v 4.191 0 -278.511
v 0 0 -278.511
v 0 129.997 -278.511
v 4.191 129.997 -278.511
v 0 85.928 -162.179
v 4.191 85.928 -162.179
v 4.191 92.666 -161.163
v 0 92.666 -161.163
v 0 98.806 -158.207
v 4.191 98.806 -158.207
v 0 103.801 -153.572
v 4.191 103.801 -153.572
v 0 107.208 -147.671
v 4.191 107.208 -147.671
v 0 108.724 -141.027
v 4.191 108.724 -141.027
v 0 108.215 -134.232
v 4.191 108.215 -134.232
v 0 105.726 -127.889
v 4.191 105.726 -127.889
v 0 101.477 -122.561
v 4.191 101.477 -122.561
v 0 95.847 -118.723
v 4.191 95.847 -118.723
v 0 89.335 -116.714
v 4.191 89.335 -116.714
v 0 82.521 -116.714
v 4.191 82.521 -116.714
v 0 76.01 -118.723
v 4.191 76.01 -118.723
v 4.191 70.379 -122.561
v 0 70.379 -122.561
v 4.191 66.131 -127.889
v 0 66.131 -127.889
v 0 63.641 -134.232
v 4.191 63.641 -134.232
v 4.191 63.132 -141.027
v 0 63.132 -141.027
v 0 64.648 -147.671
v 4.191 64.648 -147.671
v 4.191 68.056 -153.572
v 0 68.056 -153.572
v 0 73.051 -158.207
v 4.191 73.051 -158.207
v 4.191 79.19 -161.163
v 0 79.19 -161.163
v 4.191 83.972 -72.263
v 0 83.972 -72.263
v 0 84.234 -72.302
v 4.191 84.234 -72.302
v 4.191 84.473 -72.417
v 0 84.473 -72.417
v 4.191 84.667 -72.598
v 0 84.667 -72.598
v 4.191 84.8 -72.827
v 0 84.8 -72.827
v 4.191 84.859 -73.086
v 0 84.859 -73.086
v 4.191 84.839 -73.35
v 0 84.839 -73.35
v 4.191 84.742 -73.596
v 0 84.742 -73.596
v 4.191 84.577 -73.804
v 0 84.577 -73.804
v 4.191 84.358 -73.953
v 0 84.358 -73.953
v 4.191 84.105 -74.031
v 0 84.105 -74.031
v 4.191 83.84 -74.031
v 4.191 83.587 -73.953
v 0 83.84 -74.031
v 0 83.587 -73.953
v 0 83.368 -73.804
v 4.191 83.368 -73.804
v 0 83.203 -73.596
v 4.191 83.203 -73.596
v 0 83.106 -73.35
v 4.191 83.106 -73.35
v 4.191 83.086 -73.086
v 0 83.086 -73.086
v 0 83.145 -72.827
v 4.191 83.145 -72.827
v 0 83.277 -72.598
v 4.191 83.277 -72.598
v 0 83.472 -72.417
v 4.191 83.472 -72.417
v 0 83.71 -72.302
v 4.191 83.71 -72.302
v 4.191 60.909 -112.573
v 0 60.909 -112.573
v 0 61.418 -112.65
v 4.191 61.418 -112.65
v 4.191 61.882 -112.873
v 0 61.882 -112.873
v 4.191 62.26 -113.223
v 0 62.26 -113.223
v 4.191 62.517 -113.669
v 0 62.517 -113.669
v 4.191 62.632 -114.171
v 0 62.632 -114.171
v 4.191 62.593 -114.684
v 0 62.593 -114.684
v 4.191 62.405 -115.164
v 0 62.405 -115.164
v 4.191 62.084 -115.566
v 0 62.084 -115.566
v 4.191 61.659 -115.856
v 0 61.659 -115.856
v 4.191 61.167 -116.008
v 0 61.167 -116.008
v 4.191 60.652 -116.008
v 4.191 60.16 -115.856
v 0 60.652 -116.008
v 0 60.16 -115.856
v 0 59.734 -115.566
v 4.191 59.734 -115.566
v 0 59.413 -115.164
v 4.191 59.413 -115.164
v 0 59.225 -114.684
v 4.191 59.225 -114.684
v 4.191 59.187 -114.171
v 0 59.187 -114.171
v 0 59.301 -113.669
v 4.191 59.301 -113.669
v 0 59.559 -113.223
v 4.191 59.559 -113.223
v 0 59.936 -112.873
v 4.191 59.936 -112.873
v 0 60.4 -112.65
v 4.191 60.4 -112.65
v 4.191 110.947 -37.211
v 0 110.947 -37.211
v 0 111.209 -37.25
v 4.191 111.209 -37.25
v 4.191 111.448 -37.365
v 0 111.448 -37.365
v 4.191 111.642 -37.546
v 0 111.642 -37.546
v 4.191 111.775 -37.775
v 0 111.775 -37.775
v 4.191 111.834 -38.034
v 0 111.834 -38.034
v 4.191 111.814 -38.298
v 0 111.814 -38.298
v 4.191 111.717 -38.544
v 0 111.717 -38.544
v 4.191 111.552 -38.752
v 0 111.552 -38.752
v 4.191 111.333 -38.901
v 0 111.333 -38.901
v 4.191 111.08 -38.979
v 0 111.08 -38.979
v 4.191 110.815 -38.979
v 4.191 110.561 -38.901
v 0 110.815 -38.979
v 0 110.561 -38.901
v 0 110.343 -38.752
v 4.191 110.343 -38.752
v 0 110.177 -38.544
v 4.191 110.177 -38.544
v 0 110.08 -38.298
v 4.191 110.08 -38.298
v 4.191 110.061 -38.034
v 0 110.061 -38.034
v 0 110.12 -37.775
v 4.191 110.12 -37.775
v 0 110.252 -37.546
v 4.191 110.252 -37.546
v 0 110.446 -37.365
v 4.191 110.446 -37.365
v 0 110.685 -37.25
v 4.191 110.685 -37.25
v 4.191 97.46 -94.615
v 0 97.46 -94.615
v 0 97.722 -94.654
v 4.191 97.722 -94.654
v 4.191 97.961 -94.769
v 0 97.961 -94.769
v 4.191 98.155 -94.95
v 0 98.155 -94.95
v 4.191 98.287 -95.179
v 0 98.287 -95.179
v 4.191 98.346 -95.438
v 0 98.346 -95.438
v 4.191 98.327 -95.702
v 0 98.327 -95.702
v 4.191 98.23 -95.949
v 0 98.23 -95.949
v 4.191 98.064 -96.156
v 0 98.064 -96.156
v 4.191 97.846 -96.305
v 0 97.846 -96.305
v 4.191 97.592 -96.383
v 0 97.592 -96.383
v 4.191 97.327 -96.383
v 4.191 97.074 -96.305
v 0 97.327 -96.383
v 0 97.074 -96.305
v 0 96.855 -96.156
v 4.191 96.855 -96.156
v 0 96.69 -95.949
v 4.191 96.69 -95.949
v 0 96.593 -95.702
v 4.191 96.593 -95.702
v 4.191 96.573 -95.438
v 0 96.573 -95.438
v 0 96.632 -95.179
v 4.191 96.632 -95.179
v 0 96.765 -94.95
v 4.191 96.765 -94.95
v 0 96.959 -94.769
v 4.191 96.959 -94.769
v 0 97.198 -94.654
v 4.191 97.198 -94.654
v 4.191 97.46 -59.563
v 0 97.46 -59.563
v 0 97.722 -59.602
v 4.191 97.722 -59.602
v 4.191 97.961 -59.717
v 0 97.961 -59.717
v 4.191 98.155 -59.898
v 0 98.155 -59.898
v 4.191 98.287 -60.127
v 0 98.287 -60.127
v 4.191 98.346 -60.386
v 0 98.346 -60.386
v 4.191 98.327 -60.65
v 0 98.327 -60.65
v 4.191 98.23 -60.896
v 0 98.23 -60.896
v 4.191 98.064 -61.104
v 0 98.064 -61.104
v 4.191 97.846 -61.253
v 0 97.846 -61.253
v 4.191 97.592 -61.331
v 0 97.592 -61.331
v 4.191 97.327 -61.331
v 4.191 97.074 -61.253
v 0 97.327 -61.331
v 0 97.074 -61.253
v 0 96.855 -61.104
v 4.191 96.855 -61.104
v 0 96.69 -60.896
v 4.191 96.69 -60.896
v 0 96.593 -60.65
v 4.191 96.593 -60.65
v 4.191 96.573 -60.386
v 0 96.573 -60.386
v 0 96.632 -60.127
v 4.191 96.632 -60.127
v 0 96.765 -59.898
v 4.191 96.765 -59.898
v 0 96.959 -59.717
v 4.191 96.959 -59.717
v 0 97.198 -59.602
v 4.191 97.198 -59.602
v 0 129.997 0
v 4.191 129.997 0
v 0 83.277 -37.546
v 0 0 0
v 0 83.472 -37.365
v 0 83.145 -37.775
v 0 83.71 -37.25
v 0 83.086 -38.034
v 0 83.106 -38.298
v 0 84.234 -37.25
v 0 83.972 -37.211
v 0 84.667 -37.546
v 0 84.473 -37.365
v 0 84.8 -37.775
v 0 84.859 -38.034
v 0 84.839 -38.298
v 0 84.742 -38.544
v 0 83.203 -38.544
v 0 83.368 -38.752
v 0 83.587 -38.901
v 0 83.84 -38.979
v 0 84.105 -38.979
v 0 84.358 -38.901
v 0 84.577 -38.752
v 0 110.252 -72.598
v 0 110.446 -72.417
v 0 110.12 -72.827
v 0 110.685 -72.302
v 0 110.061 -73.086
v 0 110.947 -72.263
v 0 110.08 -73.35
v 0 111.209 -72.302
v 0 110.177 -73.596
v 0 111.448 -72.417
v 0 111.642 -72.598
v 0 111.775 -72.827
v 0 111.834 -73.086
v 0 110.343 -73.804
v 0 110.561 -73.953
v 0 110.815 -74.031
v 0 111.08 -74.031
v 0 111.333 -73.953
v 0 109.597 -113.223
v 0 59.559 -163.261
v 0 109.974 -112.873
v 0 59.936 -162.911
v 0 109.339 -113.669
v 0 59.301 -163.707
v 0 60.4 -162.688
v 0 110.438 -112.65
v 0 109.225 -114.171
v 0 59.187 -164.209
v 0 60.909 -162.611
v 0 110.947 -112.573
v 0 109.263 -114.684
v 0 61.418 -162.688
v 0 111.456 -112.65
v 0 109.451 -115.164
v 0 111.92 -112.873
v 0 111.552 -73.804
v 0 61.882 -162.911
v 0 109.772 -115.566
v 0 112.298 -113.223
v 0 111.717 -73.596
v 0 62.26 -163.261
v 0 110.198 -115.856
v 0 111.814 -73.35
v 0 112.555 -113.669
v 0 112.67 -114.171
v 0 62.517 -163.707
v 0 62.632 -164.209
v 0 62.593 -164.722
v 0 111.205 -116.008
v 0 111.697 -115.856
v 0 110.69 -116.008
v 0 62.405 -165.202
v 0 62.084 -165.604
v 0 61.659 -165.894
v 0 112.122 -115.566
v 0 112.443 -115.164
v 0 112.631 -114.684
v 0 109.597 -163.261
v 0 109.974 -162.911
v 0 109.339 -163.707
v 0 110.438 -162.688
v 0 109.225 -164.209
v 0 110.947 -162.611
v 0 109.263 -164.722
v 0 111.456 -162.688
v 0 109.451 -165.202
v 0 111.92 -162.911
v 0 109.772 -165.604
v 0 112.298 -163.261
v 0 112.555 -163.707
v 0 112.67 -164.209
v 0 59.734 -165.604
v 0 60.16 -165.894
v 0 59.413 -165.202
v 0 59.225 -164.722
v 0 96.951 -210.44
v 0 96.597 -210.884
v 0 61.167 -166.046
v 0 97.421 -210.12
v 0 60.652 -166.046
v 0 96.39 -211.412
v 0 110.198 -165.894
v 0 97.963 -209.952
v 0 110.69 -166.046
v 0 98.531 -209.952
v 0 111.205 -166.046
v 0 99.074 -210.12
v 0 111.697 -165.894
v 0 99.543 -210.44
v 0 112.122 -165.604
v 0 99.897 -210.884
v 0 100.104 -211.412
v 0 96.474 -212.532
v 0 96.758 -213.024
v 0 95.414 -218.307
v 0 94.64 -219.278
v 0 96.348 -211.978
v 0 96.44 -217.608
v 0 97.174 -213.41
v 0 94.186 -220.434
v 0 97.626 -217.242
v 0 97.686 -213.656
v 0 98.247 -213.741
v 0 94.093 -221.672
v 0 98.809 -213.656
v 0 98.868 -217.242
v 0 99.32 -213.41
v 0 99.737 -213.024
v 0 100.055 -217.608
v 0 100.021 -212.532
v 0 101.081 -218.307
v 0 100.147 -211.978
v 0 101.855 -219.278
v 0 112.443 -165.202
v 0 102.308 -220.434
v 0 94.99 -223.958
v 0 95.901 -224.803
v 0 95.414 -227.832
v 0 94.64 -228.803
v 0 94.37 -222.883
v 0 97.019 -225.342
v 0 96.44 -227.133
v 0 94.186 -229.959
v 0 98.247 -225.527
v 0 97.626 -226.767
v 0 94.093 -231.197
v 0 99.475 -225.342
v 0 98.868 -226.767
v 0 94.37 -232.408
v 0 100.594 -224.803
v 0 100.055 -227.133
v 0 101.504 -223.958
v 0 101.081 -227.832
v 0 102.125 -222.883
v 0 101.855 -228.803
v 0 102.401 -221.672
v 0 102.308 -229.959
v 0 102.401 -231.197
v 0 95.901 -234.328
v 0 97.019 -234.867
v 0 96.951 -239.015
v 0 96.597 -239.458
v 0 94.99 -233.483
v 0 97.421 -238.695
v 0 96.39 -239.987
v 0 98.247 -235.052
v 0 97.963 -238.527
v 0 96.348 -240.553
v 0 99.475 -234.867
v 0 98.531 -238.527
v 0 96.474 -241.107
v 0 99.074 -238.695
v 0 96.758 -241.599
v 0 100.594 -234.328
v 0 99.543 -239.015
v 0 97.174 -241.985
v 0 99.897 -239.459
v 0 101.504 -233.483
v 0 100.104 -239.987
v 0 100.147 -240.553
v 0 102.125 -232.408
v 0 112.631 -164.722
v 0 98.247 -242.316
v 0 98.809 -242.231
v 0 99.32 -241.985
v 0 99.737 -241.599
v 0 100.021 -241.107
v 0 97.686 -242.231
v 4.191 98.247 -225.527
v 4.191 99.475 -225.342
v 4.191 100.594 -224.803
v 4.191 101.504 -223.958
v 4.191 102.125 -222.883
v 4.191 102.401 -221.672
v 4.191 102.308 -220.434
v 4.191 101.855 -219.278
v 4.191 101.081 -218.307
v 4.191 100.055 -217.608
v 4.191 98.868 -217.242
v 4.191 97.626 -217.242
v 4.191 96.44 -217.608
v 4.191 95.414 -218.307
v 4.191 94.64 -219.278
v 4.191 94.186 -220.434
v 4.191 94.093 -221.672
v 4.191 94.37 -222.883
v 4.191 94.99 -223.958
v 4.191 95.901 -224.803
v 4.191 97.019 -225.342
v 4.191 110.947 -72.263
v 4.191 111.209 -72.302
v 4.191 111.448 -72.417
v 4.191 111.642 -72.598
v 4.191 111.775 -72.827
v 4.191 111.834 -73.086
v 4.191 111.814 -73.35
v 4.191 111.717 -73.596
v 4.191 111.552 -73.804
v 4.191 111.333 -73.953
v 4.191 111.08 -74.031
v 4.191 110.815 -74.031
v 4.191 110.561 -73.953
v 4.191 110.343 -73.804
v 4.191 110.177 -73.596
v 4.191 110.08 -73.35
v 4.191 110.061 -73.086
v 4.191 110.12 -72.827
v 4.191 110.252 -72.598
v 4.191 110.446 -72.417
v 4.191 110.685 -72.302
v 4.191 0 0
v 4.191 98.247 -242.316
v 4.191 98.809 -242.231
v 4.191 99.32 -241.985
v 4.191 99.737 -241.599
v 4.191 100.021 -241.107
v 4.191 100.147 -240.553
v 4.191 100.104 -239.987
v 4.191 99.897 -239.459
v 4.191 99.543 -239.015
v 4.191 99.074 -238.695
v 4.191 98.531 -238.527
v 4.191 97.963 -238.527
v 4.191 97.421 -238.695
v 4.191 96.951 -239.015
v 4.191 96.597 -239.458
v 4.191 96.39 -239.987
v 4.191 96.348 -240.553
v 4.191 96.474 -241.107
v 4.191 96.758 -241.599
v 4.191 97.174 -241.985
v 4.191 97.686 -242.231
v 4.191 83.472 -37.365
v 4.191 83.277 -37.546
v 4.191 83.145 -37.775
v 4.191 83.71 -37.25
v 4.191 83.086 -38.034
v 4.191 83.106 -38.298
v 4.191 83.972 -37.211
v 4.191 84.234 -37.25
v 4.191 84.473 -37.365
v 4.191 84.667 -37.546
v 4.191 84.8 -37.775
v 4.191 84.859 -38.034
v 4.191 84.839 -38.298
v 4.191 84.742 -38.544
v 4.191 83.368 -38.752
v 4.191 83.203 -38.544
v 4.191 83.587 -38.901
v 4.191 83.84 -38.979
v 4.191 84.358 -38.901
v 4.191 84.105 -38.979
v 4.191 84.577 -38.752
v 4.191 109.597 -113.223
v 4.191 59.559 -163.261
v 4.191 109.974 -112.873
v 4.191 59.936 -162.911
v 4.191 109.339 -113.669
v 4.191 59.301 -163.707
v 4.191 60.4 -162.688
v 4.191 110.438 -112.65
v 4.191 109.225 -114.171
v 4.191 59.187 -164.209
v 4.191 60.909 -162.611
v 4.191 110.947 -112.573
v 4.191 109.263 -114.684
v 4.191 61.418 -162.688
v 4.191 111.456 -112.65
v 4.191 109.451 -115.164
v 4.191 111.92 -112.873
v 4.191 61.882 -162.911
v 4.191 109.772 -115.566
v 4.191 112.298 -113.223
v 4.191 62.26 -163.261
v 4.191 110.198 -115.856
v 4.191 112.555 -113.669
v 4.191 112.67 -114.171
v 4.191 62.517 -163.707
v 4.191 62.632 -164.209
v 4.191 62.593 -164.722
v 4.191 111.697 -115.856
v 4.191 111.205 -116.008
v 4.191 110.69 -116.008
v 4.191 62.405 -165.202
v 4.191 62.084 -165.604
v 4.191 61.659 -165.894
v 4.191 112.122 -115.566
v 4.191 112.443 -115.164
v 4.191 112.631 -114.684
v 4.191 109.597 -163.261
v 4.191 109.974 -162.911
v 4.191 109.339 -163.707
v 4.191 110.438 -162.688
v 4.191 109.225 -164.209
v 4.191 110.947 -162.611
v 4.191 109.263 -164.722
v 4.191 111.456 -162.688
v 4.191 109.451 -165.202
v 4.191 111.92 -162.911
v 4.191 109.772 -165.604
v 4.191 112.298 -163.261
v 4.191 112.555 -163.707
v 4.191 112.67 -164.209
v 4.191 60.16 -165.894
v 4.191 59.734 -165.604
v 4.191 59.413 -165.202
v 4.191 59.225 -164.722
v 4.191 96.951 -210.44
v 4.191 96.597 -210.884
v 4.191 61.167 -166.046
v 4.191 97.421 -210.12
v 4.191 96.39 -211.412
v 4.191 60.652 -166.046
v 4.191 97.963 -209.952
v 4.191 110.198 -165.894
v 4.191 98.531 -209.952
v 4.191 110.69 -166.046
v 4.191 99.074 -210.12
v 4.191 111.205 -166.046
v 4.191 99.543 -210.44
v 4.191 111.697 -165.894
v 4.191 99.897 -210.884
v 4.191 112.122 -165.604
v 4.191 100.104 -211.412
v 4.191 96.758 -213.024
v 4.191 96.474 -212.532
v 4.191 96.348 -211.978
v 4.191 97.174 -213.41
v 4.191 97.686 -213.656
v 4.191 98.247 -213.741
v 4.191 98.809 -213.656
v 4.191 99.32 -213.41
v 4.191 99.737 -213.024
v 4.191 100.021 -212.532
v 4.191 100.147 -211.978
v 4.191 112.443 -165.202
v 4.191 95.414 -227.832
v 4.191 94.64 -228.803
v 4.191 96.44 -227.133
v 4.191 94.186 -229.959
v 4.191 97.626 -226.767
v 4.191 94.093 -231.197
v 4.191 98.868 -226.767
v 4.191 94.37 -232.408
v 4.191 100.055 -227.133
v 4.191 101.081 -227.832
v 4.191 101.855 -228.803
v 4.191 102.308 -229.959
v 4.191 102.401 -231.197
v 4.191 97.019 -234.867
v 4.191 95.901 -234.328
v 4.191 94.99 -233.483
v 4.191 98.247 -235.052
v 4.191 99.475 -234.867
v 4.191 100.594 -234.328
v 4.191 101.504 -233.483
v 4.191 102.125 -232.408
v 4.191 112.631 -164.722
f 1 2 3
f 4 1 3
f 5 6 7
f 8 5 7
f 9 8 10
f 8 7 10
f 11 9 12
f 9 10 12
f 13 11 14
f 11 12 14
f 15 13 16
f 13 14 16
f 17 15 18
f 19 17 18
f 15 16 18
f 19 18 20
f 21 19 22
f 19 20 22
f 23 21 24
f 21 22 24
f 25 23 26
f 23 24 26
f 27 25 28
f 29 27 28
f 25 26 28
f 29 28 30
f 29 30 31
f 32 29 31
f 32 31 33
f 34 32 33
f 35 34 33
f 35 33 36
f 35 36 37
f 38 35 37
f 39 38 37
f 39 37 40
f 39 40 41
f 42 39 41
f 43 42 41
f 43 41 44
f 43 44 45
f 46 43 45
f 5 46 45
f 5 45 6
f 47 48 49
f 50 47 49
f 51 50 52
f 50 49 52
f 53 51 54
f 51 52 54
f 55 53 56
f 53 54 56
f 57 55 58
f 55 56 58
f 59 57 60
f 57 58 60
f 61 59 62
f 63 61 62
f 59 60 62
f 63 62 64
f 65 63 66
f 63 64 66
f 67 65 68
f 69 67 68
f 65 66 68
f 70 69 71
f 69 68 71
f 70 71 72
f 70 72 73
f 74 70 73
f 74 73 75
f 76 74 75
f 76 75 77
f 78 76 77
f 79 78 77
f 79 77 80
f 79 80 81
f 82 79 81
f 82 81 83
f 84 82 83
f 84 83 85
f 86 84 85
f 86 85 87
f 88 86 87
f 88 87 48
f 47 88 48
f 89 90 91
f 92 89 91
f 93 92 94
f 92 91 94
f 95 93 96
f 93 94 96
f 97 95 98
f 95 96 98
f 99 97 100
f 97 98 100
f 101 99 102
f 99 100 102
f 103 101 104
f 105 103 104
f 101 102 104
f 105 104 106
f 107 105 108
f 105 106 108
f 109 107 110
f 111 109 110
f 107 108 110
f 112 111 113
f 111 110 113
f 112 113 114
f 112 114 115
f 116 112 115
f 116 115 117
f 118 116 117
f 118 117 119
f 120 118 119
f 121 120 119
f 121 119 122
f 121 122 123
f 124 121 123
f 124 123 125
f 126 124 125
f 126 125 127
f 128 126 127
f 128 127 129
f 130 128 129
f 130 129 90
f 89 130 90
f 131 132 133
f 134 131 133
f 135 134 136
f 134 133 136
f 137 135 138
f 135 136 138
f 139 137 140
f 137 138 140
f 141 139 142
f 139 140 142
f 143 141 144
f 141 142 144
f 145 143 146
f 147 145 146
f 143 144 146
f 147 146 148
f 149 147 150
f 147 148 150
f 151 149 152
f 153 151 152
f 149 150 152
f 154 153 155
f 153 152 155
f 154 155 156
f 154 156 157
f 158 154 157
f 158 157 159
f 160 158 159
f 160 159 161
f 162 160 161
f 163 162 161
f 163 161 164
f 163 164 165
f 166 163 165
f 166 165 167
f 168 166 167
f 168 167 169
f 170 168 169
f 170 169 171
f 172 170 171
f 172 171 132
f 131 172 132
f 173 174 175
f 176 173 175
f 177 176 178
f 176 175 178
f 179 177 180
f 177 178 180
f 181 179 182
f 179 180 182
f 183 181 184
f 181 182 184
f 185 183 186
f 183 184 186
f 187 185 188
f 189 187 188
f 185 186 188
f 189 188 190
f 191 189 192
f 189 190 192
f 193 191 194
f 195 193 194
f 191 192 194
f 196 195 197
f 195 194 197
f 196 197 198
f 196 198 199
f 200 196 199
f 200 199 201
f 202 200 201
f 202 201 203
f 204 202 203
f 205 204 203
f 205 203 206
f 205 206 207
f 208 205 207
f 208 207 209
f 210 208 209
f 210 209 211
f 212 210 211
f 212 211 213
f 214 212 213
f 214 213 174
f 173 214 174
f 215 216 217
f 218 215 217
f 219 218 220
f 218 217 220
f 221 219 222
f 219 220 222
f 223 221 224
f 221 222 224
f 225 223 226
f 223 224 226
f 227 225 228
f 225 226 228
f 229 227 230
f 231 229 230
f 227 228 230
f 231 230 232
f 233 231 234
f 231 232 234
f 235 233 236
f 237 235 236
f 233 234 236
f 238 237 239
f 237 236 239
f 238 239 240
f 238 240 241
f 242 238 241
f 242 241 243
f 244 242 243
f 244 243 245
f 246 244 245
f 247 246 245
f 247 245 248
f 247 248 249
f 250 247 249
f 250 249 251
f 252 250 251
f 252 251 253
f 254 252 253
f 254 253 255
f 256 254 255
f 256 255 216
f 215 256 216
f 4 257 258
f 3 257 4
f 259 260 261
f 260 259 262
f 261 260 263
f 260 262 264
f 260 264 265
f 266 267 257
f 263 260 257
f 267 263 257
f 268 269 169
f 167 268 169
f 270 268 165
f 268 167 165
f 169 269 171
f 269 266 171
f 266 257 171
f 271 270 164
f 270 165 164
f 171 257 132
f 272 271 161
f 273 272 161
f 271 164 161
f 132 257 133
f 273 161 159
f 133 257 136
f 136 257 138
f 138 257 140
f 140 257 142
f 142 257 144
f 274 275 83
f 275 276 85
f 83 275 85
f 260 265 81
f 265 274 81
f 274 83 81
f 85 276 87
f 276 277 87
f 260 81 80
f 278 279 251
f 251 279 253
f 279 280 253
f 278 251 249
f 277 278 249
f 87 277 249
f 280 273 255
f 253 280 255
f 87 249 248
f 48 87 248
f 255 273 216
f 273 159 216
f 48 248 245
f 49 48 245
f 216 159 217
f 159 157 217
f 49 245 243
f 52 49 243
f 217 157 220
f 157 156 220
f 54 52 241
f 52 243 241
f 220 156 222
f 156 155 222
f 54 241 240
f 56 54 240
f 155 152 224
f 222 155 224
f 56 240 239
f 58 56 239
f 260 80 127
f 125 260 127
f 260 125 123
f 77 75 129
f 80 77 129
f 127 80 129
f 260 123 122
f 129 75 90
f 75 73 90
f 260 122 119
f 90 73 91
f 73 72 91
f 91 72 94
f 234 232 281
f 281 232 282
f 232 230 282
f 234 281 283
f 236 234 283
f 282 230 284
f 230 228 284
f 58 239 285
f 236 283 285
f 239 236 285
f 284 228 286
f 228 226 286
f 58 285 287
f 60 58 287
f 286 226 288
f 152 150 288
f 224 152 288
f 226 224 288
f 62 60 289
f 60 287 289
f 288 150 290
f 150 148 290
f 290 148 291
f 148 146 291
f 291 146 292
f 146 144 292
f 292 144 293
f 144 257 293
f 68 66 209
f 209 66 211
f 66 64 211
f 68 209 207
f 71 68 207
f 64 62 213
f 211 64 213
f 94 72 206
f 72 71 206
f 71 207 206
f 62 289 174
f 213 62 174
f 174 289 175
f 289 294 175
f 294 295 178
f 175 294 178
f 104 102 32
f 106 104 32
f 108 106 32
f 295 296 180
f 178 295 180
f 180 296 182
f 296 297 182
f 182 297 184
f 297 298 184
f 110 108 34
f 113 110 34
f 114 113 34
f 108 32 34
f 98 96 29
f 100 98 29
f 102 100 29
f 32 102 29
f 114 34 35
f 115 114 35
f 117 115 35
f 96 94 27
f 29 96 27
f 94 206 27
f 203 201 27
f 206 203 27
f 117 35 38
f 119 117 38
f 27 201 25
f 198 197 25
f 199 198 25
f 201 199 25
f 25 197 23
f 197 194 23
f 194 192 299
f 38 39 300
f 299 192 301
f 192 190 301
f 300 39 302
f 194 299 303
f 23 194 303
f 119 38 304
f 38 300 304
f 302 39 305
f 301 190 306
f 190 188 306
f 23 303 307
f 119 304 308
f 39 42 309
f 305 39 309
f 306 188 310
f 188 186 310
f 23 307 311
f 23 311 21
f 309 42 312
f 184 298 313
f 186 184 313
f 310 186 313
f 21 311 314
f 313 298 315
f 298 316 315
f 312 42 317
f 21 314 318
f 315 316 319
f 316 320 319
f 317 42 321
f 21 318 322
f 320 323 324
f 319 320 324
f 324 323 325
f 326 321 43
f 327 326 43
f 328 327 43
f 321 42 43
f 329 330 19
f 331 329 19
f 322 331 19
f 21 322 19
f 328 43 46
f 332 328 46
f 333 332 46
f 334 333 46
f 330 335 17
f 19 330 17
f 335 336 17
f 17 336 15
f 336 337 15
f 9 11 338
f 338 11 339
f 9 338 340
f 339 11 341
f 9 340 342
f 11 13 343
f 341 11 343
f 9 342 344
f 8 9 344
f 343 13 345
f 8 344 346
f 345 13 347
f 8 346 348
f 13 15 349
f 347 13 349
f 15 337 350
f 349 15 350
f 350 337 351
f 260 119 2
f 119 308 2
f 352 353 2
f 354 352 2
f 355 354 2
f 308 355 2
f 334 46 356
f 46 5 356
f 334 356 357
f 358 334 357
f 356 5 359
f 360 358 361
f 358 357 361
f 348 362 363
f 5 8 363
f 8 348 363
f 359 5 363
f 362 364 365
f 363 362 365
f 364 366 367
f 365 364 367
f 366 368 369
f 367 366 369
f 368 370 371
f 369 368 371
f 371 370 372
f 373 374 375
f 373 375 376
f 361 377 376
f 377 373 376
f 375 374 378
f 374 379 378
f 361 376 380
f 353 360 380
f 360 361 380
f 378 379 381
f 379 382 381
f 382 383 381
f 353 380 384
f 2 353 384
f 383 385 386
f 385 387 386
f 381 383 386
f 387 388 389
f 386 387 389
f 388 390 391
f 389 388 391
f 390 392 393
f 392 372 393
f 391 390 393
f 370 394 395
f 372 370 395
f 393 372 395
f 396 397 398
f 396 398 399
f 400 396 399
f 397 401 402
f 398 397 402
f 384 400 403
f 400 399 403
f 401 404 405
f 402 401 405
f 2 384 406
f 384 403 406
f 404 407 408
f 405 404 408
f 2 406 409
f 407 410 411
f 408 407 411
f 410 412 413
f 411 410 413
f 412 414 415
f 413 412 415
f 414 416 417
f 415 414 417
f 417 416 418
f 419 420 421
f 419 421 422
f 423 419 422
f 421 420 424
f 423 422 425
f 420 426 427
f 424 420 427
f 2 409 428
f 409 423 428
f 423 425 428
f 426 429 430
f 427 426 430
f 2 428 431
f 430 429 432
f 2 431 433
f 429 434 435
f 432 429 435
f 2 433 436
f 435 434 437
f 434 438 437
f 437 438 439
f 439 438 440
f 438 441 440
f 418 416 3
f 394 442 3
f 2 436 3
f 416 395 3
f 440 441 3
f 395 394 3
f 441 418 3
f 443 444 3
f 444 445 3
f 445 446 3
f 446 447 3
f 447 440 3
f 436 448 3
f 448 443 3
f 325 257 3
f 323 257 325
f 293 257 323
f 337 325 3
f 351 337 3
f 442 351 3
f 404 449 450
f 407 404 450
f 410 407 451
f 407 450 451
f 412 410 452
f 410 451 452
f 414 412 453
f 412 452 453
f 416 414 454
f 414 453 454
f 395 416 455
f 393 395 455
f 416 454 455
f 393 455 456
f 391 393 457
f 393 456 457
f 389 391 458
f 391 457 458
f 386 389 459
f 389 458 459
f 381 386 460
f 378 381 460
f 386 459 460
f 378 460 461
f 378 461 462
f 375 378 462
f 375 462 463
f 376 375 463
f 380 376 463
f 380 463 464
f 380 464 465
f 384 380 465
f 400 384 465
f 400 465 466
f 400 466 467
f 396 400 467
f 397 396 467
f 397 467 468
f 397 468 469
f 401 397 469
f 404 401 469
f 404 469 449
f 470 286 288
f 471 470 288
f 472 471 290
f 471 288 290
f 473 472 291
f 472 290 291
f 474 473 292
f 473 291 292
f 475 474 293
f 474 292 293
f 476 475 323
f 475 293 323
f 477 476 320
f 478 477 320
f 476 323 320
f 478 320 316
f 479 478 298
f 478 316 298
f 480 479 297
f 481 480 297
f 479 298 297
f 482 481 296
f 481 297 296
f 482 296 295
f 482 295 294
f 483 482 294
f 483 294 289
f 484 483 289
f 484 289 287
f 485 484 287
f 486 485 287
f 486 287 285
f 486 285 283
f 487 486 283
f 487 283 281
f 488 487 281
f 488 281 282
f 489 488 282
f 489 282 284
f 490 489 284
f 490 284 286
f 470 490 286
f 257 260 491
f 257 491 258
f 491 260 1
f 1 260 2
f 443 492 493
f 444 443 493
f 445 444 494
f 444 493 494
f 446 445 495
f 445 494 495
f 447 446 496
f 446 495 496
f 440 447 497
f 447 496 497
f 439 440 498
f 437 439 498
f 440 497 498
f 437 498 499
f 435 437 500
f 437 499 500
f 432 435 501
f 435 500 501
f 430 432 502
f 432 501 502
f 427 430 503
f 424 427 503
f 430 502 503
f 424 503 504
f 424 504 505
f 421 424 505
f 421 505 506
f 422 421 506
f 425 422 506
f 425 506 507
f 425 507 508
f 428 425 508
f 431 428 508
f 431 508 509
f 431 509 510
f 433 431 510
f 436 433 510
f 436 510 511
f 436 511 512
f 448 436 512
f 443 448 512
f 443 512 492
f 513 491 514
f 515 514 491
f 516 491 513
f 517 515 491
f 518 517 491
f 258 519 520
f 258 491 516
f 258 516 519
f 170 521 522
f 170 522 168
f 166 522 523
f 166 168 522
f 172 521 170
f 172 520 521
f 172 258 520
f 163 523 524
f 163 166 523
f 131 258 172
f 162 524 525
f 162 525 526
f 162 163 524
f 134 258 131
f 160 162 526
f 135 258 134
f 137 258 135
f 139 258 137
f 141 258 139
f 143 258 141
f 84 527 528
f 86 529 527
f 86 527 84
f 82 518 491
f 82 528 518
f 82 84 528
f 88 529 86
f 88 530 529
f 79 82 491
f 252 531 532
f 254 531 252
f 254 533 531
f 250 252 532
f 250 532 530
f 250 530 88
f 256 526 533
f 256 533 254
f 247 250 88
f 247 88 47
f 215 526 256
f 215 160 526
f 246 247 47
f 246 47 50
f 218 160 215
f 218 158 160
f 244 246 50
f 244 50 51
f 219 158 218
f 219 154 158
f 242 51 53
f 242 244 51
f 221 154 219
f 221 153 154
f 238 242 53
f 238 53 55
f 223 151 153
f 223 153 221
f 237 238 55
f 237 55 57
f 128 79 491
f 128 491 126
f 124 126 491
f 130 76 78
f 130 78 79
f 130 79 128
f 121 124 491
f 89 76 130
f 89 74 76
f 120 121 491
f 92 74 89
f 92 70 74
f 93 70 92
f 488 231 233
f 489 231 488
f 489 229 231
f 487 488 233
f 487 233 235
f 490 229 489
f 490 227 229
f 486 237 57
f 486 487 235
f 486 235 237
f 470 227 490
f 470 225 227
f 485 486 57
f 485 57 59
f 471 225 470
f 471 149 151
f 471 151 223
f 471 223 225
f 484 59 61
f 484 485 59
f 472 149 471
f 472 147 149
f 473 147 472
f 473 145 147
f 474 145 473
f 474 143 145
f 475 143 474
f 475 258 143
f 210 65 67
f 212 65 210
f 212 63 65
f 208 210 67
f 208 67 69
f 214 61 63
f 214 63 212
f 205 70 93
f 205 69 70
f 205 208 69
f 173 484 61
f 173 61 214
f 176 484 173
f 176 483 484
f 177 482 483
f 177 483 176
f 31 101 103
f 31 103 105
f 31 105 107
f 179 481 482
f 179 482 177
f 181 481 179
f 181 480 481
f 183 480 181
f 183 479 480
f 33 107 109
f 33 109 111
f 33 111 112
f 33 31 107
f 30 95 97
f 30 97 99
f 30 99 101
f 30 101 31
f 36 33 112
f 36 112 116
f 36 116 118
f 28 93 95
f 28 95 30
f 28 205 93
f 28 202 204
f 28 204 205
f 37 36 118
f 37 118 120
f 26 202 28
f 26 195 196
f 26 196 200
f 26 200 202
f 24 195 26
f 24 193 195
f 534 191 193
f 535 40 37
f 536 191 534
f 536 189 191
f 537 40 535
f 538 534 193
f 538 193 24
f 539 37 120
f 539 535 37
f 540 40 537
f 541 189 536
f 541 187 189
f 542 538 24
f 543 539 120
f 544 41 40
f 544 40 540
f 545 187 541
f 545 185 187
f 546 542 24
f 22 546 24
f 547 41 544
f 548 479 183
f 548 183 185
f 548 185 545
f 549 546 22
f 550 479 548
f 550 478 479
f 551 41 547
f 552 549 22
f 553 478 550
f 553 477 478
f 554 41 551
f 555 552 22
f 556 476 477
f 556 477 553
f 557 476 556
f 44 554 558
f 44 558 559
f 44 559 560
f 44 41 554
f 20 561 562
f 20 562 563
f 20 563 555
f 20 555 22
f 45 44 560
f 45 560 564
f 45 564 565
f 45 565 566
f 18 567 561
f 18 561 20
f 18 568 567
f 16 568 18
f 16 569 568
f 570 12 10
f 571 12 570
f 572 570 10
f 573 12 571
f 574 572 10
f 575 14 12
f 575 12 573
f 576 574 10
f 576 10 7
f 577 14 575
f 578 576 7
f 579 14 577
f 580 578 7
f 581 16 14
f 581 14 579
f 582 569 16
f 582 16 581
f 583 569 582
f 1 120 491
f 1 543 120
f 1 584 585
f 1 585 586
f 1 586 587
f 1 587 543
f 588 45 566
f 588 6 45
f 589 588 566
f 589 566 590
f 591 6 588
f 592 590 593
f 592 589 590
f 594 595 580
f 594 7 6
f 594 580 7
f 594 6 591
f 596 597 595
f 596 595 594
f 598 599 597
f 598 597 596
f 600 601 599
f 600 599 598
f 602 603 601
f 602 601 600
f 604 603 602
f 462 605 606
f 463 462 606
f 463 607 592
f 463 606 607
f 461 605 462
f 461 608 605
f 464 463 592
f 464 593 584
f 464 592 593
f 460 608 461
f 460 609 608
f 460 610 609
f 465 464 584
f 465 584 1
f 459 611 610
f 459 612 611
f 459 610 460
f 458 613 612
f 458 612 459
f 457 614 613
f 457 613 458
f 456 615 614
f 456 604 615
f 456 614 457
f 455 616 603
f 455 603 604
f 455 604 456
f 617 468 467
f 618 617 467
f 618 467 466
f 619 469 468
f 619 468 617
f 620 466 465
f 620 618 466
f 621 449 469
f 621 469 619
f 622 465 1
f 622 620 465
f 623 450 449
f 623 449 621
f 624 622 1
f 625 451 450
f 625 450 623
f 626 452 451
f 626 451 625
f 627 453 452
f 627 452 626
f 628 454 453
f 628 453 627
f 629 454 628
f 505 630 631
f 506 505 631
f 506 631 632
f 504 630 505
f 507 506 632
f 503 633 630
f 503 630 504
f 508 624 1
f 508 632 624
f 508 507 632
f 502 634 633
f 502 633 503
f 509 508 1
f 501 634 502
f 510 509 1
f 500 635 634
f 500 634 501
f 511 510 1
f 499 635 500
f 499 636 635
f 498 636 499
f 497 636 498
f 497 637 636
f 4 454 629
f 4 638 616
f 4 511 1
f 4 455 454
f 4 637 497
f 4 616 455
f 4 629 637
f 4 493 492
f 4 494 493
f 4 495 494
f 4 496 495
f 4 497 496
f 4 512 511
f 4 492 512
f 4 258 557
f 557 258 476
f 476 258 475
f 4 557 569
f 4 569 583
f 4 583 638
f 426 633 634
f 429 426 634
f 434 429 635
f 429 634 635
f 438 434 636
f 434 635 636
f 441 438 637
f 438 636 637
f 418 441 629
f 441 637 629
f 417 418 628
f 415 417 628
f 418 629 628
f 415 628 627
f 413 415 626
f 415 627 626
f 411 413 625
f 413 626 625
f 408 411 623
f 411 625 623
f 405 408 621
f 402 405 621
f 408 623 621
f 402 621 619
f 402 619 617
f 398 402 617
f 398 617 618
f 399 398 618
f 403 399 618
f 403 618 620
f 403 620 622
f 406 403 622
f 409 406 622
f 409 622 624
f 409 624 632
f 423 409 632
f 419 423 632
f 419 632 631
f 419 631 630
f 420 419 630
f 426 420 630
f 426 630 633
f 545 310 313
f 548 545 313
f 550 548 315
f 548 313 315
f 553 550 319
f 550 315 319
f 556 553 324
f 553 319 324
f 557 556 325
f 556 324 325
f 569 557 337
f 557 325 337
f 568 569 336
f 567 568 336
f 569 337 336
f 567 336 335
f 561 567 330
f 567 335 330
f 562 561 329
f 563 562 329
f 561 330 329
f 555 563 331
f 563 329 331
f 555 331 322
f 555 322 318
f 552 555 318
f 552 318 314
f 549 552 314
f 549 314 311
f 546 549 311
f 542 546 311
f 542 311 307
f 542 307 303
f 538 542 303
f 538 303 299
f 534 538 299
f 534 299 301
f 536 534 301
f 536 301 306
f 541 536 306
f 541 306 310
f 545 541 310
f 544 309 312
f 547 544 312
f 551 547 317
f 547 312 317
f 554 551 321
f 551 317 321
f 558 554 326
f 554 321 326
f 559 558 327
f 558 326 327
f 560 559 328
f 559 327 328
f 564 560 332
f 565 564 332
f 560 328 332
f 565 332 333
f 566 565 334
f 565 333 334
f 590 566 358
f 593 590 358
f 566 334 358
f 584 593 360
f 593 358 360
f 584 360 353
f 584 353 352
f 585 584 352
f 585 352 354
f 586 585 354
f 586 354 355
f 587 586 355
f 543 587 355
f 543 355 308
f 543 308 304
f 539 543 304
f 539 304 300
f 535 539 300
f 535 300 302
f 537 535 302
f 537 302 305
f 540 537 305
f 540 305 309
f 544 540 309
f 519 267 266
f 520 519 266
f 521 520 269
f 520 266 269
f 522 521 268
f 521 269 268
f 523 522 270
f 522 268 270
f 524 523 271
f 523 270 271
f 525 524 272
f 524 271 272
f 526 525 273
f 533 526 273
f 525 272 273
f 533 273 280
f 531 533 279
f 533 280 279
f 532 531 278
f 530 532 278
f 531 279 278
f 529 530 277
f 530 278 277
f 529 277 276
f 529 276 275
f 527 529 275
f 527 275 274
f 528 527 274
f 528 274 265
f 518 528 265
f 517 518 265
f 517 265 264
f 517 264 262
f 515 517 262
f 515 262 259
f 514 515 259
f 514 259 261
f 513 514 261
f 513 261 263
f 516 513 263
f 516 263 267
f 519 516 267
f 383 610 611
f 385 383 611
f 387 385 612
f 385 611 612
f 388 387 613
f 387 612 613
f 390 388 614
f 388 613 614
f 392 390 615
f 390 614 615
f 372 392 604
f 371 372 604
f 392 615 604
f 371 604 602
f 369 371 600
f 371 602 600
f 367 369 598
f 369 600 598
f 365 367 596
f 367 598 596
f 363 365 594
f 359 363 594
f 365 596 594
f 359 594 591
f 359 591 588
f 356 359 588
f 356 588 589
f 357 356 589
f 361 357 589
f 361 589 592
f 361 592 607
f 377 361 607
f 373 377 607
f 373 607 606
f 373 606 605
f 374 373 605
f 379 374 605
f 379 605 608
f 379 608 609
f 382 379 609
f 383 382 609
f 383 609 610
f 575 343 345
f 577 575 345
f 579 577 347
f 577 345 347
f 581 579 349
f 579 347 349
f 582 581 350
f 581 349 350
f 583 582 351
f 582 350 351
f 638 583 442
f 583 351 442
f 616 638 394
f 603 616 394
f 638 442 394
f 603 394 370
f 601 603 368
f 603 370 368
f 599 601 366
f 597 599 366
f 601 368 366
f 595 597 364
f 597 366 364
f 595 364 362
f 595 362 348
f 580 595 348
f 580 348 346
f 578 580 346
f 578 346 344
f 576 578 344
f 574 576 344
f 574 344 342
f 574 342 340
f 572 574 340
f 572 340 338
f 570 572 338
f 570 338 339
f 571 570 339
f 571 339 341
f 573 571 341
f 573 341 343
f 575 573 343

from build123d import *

# Parameters (mm, degrees)
SKETCH1_W             = 278.511
SKETCH1_H             = 129.9972
BOSS_EXTRUDE1_DEPTH   = 4.191
F_2_56_TAPPED_HOLE2_D = 1.778
F_8_32_TAPPED_HOLE1_D = 3.4544
CUT_EXTRUDE1_REACH    = 309.384
SKETCH25_R            = 22.86
CUT_EXTRUDE2_REACH    = 309.384
SKETCH27_R            = 4.1656
SKETCH27_R_2          = 1.905


with BuildPart() as part:
    # Sketch1 → Boss-Extrude1 (new body)
    with BuildSketch(Plane(origin=(0, 0, 0), x_dir=(0, 0, -1), z_dir=(1, 0, 0))):
        with Locations((139.2555, 64.9986)):
            Rectangle(SKETCH1_W, SKETCH1_H)
    extrude(amount=BOSS_EXTRUDE1_DEPTH)

    # #2-56 Tapped Hole2 (through all)
    with Locations(Plane(origin=(4.191, 0, 0), x_dir=(0, 0, -1), z_dir=(1, 0, 0))):
        with Locations((38.1, 83.9724), (38.1, 110.9472), (60.452, 97.4598), (73.152, 110.9472), (73.152, 83.9724), (95.504, 97.4598)):
            Hole(F_2_56_TAPPED_HOLE2_D / 2)

    # #8-32 Tapped Hole1 (through all)
    with Locations(Plane(origin=(4.191, 0, 0), x_dir=(0, 0, -1), z_dir=(1, 0, 0))):
        with Locations((114.3, 60.9092), (114.3, 110.9472), (164.338, 110.9472), (164.338, 60.9092)):
            Hole(F_8_32_TAPPED_HOLE1_D / 2)

    # Sketch25 → Cut-Extrude1 (cut, up to next)
    with BuildSketch(Plane(origin=(4.191, 0, 0), x_dir=(0, 0, -1), z_dir=(1, 0, 0)), mode=Mode.PRIVATE) as cut_extrude1_sk1:
        with Locations((139.319, 85.9282)):
            Circle(SKETCH25_R)
    cut_extrude1_tool1 = extrude(cut_extrude1_sk1.sketch, amount=-CUT_EXTRUDE1_REACH, mode=Mode.PRIVATE) & part.part
    add(cut_extrude1_tool1.solids().sort_by_distance((4.191, 85.9282, -139.319))[0], mode=Mode.SUBTRACT)

    # Sketch27 → Cut-Extrude2 (cut, up to next)
    with BuildSketch(Plane(origin=(4.191, 0, 0), x_dir=(0, 0, -1), z_dir=(1, 0, 0)), mode=Mode.PRIVATE) as cut_extrude2_sk1:
        with Locations((221.361, 98.2472)):
            Circle(SKETCH27_R)
    cut_extrude2_tool1 = extrude(cut_extrude2_sk1.sketch, amount=-CUT_EXTRUDE2_REACH, mode=Mode.PRIVATE) & part.part
    # Sketch27 → Cut-Extrude2 (cut, up to next)
    with BuildSketch(Plane(origin=(4.191, 0, 0), x_dir=(0, 0, -1), z_dir=(1, 0, 0)), mode=Mode.PRIVATE) as cut_extrude2_sk2:
        with Locations((211.836, 98.2472)):
            Circle(SKETCH27_R_2)
    cut_extrude2_tool2 = extrude(cut_extrude2_sk2.sketch, amount=-CUT_EXTRUDE2_REACH, mode=Mode.PRIVATE) & part.part
    # Sketch27 → Cut-Extrude2 (cut, up to next)
    with BuildSketch(Plane(origin=(4.191, 0, 0), x_dir=(0, 0, -1), z_dir=(1, 0, 0)), mode=Mode.PRIVATE) as cut_extrude2_sk3:
        with Locations((230.886, 98.2472)):
            Circle(SKETCH27_R)
    cut_extrude2_tool3 = extrude(cut_extrude2_sk3.sketch, amount=-CUT_EXTRUDE2_REACH, mode=Mode.PRIVATE) & part.part
    # Sketch27 → Cut-Extrude2 (cut, up to next)
    with BuildSketch(Plane(origin=(4.191, 0, 0), x_dir=(0, 0, -1), z_dir=(1, 0, 0)), mode=Mode.PRIVATE) as cut_extrude2_sk4:
        with Locations((240.411, 98.2472)):
            Circle(SKETCH27_R_2)
    cut_extrude2_tool4 = extrude(cut_extrude2_sk4.sketch, amount=-CUT_EXTRUDE2_REACH, mode=Mode.PRIVATE) & part.part
    add(cut_extrude2_tool1.solids().sort_by_distance((4.191, 98.2472, -221.361))[0], mode=Mode.SUBTRACT)
    add(cut_extrude2_tool2.solids().sort_by_distance((4.191, 98.2472, -211.836))[0], mode=Mode.SUBTRACT)
    add(cut_extrude2_tool3.solids().sort_by_distance((4.191, 98.2472, -230.886))[0], mode=Mode.SUBTRACT)
    add(cut_extrude2_tool4.solids().sort_by_distance((4.191, 98.2472, -240.411))[0], mode=Mode.SUBTRACT)


solid = part.part
